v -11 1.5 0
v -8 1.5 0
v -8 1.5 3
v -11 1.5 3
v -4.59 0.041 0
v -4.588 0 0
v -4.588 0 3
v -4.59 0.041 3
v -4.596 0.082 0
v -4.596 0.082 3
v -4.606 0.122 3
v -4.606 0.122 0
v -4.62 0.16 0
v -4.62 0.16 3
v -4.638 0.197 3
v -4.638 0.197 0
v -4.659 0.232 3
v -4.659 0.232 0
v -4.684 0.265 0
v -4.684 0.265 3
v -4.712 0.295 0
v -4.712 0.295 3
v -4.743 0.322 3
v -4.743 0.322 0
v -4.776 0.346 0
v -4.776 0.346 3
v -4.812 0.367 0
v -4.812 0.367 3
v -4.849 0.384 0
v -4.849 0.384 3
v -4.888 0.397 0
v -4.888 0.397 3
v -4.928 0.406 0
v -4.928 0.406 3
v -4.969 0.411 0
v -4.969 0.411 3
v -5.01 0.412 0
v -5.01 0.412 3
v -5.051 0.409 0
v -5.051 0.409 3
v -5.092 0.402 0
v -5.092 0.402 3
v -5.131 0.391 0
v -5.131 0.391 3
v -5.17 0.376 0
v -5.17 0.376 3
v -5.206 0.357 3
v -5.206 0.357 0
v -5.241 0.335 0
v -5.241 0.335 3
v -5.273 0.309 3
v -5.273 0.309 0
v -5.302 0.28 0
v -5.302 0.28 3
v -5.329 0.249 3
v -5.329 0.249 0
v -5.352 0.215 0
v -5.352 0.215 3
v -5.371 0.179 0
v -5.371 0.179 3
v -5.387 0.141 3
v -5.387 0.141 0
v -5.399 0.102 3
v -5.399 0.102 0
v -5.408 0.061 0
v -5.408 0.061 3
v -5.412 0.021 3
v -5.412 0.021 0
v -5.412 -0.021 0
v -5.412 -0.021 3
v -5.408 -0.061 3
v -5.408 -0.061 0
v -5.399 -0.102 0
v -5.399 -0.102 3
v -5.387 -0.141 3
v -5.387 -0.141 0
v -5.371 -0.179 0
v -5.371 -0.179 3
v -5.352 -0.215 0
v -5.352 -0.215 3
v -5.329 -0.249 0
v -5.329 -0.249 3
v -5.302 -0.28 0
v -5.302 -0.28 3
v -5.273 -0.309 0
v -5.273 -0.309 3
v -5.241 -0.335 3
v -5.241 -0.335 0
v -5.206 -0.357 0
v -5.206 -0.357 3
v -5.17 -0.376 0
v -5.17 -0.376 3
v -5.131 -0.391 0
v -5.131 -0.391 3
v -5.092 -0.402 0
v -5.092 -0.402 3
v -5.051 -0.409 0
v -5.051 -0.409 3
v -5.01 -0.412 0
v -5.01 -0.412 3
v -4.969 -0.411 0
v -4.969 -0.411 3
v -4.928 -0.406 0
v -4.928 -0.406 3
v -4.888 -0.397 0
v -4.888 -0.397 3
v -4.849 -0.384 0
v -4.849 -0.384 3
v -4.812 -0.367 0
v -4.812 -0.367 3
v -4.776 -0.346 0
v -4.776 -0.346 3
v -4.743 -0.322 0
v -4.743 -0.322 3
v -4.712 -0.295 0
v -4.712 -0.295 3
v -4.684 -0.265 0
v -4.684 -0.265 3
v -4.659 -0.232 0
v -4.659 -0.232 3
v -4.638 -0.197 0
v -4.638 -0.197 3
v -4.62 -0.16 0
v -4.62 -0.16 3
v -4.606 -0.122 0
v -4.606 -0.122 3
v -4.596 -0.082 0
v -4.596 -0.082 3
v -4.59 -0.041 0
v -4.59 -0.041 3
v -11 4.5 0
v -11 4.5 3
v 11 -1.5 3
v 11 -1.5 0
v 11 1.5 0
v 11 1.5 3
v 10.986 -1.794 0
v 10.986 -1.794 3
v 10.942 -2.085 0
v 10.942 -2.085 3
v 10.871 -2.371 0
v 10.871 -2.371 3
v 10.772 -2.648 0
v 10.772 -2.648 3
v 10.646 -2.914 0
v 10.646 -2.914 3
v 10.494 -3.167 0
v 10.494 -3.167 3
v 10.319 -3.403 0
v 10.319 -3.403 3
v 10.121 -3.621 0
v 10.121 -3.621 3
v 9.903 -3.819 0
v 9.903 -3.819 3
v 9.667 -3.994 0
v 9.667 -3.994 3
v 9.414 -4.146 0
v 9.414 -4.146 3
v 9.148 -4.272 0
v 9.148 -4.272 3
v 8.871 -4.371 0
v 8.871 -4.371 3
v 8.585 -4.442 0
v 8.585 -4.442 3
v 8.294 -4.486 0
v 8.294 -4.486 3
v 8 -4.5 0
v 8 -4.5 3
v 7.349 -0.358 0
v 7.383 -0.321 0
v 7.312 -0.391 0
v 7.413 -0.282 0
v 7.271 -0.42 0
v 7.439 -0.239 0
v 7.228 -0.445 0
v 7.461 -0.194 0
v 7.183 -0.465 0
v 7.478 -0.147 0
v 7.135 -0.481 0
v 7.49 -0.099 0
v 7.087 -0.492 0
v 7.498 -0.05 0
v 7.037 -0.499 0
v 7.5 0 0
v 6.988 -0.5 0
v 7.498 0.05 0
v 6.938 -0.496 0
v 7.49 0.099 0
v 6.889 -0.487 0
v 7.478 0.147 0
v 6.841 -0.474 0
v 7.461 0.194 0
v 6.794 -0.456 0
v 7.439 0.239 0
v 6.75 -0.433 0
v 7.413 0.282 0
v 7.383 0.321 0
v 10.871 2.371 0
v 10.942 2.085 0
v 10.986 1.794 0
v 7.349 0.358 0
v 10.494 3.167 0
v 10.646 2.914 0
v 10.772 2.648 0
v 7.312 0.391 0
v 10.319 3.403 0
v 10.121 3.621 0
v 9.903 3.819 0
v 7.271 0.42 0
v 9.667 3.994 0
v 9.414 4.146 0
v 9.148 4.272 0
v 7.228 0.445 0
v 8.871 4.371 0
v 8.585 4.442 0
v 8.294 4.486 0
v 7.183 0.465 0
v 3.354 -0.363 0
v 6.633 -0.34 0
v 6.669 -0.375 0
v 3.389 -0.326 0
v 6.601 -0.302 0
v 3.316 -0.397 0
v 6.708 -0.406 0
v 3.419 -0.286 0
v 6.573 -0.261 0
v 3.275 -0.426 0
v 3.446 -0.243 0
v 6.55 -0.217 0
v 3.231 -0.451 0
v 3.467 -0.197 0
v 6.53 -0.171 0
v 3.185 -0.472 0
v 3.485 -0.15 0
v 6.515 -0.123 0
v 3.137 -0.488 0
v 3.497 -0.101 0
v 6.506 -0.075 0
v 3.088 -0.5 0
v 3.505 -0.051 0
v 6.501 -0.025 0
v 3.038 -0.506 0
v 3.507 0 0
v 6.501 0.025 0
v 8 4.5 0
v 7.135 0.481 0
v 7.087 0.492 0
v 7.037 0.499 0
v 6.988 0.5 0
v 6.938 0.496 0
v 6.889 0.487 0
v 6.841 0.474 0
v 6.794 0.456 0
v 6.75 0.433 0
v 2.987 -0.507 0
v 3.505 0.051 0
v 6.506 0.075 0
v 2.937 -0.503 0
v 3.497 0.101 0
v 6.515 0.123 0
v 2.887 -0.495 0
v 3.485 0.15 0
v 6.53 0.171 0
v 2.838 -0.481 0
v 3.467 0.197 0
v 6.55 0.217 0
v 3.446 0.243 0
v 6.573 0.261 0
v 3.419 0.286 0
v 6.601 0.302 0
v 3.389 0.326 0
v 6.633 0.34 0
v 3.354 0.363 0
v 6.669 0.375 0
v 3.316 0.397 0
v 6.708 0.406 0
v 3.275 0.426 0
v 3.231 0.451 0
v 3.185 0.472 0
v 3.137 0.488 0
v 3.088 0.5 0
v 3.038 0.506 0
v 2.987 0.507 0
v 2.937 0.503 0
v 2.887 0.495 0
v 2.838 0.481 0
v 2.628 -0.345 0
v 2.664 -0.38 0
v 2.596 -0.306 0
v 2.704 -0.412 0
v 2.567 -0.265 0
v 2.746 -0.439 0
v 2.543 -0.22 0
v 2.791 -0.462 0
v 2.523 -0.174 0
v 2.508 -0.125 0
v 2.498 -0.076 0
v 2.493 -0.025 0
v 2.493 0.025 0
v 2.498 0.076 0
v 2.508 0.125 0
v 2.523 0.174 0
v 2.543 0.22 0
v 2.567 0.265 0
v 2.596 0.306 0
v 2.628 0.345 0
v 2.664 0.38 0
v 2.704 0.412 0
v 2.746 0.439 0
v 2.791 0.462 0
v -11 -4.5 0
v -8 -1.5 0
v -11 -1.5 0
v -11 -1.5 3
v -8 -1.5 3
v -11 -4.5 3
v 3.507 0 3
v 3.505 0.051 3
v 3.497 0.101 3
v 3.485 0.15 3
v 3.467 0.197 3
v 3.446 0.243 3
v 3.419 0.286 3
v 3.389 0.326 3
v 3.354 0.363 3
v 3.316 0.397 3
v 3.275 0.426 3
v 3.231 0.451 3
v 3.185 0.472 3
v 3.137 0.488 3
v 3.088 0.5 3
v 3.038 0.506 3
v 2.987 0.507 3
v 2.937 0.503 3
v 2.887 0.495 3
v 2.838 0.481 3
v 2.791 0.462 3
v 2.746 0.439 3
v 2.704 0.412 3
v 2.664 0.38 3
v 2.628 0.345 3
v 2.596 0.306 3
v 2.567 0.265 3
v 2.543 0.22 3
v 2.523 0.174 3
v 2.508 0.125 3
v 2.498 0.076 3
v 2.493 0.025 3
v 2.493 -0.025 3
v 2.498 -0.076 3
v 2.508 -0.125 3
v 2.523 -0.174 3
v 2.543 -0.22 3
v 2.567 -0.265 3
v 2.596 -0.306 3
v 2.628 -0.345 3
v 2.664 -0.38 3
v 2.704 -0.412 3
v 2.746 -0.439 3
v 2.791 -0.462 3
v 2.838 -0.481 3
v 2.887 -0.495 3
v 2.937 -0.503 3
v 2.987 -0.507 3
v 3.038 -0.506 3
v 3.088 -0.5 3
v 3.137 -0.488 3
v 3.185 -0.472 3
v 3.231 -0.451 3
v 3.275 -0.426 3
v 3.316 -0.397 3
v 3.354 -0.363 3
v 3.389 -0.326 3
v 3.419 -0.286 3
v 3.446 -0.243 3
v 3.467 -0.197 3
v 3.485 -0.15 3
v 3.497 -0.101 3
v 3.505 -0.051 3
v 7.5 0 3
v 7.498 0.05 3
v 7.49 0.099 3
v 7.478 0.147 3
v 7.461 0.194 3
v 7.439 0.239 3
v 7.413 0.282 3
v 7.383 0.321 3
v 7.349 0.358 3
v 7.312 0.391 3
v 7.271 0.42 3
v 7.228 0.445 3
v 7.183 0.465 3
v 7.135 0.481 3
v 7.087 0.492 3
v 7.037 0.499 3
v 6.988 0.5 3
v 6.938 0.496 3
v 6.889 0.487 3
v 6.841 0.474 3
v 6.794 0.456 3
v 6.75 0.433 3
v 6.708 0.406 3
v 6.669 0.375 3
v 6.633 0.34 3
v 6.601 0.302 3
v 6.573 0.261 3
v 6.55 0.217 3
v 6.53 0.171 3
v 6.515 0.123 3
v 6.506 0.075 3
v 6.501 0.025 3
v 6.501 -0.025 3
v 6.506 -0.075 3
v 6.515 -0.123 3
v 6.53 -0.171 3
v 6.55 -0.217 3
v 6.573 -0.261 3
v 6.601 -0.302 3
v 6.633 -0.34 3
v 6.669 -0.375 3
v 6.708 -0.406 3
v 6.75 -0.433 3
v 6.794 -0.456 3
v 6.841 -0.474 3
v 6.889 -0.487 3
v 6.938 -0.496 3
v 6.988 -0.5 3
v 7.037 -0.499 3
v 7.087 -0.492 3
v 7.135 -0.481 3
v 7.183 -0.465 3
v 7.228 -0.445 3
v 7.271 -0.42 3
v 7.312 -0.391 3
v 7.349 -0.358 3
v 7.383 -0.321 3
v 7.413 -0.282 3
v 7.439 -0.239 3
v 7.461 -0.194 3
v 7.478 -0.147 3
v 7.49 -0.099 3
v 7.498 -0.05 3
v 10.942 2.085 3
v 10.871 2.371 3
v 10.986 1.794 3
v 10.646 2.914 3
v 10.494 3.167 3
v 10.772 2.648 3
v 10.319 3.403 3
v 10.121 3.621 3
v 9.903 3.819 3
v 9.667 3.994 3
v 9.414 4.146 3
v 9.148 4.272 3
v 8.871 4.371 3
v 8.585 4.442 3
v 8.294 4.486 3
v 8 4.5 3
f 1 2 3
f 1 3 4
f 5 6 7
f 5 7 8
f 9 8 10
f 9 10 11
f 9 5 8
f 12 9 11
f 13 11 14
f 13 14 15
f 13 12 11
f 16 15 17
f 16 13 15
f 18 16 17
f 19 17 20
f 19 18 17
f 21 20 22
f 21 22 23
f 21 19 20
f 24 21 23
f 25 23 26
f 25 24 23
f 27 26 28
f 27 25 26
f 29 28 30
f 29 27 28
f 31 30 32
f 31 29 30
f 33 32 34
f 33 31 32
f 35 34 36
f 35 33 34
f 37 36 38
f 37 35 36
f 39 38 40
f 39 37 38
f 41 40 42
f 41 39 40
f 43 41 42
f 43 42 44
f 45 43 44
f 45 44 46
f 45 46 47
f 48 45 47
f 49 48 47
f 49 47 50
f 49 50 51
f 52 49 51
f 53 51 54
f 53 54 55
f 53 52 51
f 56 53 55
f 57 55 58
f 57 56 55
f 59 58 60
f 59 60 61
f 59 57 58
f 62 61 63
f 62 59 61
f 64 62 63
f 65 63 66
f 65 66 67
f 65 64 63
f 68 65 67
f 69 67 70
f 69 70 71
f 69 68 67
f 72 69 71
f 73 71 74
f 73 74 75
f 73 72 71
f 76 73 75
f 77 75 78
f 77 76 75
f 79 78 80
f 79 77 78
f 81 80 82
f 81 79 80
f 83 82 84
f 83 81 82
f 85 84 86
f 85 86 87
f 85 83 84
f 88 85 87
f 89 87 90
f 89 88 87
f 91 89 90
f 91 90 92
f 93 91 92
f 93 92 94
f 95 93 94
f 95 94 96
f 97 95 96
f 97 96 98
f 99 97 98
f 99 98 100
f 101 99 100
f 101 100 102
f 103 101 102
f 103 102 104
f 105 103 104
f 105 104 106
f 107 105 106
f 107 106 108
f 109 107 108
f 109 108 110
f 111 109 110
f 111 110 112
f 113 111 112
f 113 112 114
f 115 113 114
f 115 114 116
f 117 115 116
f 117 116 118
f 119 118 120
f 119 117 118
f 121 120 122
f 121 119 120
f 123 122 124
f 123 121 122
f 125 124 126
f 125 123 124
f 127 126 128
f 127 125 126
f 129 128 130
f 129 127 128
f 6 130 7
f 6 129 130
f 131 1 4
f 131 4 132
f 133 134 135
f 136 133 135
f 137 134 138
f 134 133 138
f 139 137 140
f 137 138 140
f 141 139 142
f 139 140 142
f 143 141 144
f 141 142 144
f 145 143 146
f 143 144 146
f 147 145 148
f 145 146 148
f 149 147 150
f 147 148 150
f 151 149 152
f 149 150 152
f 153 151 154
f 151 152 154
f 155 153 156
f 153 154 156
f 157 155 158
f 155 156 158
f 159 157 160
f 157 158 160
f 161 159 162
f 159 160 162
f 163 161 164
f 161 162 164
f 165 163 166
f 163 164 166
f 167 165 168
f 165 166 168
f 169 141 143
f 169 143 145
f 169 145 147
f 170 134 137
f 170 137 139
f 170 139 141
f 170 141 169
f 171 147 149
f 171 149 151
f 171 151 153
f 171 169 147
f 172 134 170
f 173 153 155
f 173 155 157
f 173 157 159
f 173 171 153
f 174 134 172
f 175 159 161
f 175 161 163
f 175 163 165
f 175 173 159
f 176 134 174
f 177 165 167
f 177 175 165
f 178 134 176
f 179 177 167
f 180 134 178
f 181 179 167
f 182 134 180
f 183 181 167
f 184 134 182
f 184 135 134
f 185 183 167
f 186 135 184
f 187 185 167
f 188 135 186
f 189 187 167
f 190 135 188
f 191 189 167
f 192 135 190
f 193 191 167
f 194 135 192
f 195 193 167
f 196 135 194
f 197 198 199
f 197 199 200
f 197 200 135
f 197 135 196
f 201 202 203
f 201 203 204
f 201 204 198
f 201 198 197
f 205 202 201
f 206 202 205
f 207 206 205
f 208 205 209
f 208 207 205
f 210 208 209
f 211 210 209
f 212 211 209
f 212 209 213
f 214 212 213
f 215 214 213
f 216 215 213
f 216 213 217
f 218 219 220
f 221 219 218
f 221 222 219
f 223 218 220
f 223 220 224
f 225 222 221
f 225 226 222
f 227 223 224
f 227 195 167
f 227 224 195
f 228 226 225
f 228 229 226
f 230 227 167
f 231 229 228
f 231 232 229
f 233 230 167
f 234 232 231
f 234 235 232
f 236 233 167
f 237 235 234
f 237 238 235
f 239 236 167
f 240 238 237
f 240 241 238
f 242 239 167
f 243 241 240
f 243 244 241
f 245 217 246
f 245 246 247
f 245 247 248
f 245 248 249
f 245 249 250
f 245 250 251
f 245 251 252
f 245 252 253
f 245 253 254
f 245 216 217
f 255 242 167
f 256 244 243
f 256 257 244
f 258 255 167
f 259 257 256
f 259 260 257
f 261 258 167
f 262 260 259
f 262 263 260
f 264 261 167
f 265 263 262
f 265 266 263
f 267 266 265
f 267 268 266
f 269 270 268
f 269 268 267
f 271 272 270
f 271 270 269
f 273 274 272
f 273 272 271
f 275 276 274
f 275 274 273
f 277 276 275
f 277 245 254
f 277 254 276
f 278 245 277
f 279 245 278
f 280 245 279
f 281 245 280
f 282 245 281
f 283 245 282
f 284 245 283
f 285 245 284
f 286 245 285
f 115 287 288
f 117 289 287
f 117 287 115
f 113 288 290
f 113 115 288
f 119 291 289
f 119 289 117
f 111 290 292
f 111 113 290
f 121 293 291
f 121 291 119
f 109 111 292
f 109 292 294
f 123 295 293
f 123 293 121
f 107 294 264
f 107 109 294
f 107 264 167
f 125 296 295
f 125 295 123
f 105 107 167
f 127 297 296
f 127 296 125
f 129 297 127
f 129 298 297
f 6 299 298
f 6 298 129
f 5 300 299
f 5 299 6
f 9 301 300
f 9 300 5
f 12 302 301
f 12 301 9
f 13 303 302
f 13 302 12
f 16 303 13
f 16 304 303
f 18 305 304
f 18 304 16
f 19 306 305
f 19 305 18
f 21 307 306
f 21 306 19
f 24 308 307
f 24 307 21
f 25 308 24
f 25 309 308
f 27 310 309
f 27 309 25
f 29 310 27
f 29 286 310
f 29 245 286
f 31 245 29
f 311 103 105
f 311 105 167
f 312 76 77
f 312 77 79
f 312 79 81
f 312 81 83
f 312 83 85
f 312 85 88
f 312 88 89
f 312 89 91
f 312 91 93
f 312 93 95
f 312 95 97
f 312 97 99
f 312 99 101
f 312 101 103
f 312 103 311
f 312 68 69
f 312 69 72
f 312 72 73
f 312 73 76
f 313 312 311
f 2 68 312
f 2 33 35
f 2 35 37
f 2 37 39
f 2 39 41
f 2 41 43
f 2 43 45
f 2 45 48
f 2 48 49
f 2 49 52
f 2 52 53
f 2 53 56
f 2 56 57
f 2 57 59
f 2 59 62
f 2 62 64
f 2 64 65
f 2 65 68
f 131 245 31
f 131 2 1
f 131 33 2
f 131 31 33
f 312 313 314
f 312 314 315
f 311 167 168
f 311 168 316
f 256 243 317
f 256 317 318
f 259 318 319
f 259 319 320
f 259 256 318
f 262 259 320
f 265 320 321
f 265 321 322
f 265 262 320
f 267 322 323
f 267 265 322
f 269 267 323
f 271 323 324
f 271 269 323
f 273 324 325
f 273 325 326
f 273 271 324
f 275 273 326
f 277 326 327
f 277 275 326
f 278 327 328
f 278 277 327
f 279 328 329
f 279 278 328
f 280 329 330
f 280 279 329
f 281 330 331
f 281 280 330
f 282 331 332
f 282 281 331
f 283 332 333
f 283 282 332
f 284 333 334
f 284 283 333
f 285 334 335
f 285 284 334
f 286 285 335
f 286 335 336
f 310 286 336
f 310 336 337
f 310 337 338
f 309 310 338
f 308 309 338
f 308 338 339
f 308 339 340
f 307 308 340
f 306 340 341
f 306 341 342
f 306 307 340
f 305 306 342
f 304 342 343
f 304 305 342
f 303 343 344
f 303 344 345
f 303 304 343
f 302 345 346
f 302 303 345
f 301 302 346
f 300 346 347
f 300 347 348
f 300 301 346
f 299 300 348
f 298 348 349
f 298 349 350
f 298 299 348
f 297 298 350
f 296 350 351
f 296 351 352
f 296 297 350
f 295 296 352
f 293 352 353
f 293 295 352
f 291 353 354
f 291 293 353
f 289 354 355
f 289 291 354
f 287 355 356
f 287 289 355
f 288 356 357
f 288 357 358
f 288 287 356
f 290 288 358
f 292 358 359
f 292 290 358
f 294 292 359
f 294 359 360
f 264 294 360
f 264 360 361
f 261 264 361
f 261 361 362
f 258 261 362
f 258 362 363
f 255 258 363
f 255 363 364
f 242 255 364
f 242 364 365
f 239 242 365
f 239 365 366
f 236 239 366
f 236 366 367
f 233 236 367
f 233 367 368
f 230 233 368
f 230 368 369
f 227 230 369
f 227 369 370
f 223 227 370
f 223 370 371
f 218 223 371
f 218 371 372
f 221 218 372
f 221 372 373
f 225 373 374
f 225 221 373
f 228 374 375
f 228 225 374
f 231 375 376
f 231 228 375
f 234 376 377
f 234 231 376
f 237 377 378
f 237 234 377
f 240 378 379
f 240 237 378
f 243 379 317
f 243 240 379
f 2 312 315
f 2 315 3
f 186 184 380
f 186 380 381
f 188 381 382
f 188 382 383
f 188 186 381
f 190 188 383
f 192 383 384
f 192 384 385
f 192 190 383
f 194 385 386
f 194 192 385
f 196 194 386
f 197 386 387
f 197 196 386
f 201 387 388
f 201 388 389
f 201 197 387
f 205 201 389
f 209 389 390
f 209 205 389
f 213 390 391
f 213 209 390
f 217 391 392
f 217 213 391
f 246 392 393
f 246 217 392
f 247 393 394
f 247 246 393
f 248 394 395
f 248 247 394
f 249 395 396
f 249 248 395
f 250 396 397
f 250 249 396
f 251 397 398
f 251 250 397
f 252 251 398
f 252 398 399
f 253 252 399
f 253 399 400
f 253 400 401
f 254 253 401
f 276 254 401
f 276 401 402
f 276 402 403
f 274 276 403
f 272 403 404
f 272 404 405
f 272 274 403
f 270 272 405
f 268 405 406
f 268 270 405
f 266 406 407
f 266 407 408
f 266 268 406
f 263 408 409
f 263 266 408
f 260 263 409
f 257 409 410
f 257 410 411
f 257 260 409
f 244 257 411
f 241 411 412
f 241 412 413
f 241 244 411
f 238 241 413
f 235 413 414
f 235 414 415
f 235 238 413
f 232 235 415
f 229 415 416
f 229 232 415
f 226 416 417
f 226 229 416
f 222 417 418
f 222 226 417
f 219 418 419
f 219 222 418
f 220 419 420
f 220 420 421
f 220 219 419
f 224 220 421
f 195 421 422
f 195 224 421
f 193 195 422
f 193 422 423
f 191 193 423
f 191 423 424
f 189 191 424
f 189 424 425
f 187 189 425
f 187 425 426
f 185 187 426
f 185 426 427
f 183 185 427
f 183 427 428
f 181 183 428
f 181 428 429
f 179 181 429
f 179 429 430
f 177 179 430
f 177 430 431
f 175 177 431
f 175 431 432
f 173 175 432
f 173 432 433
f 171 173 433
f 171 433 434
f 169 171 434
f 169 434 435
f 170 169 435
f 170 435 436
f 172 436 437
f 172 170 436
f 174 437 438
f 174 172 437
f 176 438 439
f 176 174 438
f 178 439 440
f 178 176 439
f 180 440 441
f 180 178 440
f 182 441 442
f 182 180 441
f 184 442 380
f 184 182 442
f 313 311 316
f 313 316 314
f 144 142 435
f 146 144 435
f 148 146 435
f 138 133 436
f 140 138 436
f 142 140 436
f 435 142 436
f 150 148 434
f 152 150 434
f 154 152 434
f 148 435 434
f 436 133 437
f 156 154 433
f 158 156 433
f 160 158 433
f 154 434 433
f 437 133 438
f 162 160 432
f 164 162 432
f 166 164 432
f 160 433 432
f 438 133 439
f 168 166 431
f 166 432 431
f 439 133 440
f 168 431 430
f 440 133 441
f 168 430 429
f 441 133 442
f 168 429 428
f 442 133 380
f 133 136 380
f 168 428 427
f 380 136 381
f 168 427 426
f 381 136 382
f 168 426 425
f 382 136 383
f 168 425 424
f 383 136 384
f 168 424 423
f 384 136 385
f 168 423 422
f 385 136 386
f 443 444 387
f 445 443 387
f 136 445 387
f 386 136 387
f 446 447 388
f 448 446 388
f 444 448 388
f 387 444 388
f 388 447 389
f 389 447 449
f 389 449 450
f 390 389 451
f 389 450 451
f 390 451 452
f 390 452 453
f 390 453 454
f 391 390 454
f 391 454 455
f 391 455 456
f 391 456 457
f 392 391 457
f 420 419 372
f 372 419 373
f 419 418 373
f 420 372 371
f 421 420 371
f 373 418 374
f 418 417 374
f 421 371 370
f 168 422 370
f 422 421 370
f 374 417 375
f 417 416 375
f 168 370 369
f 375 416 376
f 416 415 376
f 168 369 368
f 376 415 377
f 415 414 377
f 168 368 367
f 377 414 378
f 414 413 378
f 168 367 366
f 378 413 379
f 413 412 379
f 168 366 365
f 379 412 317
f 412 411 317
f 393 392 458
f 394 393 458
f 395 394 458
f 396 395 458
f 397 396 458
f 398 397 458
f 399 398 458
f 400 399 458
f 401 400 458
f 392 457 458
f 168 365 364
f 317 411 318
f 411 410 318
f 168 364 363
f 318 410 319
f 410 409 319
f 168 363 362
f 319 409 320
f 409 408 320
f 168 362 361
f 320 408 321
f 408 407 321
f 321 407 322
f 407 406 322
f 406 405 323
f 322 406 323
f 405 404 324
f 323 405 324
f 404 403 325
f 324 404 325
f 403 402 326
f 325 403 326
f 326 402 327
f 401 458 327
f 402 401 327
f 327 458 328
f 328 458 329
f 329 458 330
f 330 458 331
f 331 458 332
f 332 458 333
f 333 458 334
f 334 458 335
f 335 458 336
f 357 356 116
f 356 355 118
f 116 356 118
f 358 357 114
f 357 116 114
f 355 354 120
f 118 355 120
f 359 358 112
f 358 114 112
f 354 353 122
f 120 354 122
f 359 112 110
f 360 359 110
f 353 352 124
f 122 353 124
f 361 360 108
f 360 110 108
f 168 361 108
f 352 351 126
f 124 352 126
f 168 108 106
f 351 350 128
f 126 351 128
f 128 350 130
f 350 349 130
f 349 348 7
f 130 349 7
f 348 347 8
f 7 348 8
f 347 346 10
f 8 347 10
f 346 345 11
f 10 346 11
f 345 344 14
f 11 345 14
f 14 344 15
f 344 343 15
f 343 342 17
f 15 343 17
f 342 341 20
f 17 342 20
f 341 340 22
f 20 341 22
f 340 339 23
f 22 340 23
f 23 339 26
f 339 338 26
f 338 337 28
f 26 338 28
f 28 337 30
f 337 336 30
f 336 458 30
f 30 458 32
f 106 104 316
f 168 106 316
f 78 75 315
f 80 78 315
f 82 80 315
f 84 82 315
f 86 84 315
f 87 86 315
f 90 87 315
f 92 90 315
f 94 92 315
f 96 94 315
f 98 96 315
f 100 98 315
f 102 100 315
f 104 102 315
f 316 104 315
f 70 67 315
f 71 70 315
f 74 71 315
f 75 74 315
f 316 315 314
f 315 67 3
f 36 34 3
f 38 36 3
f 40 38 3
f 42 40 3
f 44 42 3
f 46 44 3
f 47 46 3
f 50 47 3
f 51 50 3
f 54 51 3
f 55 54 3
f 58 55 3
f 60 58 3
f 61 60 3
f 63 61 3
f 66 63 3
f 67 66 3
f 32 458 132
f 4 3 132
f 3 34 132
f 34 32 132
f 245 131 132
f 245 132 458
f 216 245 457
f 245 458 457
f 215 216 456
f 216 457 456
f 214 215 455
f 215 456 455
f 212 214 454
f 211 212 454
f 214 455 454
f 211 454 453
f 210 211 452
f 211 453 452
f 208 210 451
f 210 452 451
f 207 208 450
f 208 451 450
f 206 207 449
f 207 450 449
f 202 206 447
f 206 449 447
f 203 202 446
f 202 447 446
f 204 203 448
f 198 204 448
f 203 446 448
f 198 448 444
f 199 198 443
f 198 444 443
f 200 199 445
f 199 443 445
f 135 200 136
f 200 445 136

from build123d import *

# Parameters (mm, degrees)
SKETCH2_R           = 0.5
SKETCH2_R_2         = 0.507316736
SKETCH2_R_3         = 0.412242995
BOSS_EXTRUDE1_DEPTH = 3
FILLET1_R           = 3


with BuildPart() as part:
    # Sketch2 → Boss-Extrude1 (new body)
    with BuildSketch(Plane.XY):
        Polygon((-11, 4.5), (11, 4.5), (11, 0.5), (11, -0.5), (11, -4.5), (-11, -4.5), (-11, -1.5), (-8, -1.5), (-8, 1.5), (-11, 1.5), align=None)
        with Locations((7, 0)):
            Circle(SKETCH2_R, mode=Mode.SUBTRACT)
        with Locations((3, 0)):
            Circle(SKETCH2_R_2, mode=Mode.SUBTRACT)
        with Locations((-5, 0)):
            Circle(SKETCH2_R_3, mode=Mode.SUBTRACT)
    extrude(amount=BOSS_EXTRUDE1_DEPTH)

    # Fillet1
    fillet1_edges = [part.edges().sort_by_distance(p)[0] for p in [
        (11, -4.5, 1.5),
        (11, 4.5, 1.5),
    ]]
    fillet(fillet1_edges, radius=FILLET1_R)


solid = part.part
